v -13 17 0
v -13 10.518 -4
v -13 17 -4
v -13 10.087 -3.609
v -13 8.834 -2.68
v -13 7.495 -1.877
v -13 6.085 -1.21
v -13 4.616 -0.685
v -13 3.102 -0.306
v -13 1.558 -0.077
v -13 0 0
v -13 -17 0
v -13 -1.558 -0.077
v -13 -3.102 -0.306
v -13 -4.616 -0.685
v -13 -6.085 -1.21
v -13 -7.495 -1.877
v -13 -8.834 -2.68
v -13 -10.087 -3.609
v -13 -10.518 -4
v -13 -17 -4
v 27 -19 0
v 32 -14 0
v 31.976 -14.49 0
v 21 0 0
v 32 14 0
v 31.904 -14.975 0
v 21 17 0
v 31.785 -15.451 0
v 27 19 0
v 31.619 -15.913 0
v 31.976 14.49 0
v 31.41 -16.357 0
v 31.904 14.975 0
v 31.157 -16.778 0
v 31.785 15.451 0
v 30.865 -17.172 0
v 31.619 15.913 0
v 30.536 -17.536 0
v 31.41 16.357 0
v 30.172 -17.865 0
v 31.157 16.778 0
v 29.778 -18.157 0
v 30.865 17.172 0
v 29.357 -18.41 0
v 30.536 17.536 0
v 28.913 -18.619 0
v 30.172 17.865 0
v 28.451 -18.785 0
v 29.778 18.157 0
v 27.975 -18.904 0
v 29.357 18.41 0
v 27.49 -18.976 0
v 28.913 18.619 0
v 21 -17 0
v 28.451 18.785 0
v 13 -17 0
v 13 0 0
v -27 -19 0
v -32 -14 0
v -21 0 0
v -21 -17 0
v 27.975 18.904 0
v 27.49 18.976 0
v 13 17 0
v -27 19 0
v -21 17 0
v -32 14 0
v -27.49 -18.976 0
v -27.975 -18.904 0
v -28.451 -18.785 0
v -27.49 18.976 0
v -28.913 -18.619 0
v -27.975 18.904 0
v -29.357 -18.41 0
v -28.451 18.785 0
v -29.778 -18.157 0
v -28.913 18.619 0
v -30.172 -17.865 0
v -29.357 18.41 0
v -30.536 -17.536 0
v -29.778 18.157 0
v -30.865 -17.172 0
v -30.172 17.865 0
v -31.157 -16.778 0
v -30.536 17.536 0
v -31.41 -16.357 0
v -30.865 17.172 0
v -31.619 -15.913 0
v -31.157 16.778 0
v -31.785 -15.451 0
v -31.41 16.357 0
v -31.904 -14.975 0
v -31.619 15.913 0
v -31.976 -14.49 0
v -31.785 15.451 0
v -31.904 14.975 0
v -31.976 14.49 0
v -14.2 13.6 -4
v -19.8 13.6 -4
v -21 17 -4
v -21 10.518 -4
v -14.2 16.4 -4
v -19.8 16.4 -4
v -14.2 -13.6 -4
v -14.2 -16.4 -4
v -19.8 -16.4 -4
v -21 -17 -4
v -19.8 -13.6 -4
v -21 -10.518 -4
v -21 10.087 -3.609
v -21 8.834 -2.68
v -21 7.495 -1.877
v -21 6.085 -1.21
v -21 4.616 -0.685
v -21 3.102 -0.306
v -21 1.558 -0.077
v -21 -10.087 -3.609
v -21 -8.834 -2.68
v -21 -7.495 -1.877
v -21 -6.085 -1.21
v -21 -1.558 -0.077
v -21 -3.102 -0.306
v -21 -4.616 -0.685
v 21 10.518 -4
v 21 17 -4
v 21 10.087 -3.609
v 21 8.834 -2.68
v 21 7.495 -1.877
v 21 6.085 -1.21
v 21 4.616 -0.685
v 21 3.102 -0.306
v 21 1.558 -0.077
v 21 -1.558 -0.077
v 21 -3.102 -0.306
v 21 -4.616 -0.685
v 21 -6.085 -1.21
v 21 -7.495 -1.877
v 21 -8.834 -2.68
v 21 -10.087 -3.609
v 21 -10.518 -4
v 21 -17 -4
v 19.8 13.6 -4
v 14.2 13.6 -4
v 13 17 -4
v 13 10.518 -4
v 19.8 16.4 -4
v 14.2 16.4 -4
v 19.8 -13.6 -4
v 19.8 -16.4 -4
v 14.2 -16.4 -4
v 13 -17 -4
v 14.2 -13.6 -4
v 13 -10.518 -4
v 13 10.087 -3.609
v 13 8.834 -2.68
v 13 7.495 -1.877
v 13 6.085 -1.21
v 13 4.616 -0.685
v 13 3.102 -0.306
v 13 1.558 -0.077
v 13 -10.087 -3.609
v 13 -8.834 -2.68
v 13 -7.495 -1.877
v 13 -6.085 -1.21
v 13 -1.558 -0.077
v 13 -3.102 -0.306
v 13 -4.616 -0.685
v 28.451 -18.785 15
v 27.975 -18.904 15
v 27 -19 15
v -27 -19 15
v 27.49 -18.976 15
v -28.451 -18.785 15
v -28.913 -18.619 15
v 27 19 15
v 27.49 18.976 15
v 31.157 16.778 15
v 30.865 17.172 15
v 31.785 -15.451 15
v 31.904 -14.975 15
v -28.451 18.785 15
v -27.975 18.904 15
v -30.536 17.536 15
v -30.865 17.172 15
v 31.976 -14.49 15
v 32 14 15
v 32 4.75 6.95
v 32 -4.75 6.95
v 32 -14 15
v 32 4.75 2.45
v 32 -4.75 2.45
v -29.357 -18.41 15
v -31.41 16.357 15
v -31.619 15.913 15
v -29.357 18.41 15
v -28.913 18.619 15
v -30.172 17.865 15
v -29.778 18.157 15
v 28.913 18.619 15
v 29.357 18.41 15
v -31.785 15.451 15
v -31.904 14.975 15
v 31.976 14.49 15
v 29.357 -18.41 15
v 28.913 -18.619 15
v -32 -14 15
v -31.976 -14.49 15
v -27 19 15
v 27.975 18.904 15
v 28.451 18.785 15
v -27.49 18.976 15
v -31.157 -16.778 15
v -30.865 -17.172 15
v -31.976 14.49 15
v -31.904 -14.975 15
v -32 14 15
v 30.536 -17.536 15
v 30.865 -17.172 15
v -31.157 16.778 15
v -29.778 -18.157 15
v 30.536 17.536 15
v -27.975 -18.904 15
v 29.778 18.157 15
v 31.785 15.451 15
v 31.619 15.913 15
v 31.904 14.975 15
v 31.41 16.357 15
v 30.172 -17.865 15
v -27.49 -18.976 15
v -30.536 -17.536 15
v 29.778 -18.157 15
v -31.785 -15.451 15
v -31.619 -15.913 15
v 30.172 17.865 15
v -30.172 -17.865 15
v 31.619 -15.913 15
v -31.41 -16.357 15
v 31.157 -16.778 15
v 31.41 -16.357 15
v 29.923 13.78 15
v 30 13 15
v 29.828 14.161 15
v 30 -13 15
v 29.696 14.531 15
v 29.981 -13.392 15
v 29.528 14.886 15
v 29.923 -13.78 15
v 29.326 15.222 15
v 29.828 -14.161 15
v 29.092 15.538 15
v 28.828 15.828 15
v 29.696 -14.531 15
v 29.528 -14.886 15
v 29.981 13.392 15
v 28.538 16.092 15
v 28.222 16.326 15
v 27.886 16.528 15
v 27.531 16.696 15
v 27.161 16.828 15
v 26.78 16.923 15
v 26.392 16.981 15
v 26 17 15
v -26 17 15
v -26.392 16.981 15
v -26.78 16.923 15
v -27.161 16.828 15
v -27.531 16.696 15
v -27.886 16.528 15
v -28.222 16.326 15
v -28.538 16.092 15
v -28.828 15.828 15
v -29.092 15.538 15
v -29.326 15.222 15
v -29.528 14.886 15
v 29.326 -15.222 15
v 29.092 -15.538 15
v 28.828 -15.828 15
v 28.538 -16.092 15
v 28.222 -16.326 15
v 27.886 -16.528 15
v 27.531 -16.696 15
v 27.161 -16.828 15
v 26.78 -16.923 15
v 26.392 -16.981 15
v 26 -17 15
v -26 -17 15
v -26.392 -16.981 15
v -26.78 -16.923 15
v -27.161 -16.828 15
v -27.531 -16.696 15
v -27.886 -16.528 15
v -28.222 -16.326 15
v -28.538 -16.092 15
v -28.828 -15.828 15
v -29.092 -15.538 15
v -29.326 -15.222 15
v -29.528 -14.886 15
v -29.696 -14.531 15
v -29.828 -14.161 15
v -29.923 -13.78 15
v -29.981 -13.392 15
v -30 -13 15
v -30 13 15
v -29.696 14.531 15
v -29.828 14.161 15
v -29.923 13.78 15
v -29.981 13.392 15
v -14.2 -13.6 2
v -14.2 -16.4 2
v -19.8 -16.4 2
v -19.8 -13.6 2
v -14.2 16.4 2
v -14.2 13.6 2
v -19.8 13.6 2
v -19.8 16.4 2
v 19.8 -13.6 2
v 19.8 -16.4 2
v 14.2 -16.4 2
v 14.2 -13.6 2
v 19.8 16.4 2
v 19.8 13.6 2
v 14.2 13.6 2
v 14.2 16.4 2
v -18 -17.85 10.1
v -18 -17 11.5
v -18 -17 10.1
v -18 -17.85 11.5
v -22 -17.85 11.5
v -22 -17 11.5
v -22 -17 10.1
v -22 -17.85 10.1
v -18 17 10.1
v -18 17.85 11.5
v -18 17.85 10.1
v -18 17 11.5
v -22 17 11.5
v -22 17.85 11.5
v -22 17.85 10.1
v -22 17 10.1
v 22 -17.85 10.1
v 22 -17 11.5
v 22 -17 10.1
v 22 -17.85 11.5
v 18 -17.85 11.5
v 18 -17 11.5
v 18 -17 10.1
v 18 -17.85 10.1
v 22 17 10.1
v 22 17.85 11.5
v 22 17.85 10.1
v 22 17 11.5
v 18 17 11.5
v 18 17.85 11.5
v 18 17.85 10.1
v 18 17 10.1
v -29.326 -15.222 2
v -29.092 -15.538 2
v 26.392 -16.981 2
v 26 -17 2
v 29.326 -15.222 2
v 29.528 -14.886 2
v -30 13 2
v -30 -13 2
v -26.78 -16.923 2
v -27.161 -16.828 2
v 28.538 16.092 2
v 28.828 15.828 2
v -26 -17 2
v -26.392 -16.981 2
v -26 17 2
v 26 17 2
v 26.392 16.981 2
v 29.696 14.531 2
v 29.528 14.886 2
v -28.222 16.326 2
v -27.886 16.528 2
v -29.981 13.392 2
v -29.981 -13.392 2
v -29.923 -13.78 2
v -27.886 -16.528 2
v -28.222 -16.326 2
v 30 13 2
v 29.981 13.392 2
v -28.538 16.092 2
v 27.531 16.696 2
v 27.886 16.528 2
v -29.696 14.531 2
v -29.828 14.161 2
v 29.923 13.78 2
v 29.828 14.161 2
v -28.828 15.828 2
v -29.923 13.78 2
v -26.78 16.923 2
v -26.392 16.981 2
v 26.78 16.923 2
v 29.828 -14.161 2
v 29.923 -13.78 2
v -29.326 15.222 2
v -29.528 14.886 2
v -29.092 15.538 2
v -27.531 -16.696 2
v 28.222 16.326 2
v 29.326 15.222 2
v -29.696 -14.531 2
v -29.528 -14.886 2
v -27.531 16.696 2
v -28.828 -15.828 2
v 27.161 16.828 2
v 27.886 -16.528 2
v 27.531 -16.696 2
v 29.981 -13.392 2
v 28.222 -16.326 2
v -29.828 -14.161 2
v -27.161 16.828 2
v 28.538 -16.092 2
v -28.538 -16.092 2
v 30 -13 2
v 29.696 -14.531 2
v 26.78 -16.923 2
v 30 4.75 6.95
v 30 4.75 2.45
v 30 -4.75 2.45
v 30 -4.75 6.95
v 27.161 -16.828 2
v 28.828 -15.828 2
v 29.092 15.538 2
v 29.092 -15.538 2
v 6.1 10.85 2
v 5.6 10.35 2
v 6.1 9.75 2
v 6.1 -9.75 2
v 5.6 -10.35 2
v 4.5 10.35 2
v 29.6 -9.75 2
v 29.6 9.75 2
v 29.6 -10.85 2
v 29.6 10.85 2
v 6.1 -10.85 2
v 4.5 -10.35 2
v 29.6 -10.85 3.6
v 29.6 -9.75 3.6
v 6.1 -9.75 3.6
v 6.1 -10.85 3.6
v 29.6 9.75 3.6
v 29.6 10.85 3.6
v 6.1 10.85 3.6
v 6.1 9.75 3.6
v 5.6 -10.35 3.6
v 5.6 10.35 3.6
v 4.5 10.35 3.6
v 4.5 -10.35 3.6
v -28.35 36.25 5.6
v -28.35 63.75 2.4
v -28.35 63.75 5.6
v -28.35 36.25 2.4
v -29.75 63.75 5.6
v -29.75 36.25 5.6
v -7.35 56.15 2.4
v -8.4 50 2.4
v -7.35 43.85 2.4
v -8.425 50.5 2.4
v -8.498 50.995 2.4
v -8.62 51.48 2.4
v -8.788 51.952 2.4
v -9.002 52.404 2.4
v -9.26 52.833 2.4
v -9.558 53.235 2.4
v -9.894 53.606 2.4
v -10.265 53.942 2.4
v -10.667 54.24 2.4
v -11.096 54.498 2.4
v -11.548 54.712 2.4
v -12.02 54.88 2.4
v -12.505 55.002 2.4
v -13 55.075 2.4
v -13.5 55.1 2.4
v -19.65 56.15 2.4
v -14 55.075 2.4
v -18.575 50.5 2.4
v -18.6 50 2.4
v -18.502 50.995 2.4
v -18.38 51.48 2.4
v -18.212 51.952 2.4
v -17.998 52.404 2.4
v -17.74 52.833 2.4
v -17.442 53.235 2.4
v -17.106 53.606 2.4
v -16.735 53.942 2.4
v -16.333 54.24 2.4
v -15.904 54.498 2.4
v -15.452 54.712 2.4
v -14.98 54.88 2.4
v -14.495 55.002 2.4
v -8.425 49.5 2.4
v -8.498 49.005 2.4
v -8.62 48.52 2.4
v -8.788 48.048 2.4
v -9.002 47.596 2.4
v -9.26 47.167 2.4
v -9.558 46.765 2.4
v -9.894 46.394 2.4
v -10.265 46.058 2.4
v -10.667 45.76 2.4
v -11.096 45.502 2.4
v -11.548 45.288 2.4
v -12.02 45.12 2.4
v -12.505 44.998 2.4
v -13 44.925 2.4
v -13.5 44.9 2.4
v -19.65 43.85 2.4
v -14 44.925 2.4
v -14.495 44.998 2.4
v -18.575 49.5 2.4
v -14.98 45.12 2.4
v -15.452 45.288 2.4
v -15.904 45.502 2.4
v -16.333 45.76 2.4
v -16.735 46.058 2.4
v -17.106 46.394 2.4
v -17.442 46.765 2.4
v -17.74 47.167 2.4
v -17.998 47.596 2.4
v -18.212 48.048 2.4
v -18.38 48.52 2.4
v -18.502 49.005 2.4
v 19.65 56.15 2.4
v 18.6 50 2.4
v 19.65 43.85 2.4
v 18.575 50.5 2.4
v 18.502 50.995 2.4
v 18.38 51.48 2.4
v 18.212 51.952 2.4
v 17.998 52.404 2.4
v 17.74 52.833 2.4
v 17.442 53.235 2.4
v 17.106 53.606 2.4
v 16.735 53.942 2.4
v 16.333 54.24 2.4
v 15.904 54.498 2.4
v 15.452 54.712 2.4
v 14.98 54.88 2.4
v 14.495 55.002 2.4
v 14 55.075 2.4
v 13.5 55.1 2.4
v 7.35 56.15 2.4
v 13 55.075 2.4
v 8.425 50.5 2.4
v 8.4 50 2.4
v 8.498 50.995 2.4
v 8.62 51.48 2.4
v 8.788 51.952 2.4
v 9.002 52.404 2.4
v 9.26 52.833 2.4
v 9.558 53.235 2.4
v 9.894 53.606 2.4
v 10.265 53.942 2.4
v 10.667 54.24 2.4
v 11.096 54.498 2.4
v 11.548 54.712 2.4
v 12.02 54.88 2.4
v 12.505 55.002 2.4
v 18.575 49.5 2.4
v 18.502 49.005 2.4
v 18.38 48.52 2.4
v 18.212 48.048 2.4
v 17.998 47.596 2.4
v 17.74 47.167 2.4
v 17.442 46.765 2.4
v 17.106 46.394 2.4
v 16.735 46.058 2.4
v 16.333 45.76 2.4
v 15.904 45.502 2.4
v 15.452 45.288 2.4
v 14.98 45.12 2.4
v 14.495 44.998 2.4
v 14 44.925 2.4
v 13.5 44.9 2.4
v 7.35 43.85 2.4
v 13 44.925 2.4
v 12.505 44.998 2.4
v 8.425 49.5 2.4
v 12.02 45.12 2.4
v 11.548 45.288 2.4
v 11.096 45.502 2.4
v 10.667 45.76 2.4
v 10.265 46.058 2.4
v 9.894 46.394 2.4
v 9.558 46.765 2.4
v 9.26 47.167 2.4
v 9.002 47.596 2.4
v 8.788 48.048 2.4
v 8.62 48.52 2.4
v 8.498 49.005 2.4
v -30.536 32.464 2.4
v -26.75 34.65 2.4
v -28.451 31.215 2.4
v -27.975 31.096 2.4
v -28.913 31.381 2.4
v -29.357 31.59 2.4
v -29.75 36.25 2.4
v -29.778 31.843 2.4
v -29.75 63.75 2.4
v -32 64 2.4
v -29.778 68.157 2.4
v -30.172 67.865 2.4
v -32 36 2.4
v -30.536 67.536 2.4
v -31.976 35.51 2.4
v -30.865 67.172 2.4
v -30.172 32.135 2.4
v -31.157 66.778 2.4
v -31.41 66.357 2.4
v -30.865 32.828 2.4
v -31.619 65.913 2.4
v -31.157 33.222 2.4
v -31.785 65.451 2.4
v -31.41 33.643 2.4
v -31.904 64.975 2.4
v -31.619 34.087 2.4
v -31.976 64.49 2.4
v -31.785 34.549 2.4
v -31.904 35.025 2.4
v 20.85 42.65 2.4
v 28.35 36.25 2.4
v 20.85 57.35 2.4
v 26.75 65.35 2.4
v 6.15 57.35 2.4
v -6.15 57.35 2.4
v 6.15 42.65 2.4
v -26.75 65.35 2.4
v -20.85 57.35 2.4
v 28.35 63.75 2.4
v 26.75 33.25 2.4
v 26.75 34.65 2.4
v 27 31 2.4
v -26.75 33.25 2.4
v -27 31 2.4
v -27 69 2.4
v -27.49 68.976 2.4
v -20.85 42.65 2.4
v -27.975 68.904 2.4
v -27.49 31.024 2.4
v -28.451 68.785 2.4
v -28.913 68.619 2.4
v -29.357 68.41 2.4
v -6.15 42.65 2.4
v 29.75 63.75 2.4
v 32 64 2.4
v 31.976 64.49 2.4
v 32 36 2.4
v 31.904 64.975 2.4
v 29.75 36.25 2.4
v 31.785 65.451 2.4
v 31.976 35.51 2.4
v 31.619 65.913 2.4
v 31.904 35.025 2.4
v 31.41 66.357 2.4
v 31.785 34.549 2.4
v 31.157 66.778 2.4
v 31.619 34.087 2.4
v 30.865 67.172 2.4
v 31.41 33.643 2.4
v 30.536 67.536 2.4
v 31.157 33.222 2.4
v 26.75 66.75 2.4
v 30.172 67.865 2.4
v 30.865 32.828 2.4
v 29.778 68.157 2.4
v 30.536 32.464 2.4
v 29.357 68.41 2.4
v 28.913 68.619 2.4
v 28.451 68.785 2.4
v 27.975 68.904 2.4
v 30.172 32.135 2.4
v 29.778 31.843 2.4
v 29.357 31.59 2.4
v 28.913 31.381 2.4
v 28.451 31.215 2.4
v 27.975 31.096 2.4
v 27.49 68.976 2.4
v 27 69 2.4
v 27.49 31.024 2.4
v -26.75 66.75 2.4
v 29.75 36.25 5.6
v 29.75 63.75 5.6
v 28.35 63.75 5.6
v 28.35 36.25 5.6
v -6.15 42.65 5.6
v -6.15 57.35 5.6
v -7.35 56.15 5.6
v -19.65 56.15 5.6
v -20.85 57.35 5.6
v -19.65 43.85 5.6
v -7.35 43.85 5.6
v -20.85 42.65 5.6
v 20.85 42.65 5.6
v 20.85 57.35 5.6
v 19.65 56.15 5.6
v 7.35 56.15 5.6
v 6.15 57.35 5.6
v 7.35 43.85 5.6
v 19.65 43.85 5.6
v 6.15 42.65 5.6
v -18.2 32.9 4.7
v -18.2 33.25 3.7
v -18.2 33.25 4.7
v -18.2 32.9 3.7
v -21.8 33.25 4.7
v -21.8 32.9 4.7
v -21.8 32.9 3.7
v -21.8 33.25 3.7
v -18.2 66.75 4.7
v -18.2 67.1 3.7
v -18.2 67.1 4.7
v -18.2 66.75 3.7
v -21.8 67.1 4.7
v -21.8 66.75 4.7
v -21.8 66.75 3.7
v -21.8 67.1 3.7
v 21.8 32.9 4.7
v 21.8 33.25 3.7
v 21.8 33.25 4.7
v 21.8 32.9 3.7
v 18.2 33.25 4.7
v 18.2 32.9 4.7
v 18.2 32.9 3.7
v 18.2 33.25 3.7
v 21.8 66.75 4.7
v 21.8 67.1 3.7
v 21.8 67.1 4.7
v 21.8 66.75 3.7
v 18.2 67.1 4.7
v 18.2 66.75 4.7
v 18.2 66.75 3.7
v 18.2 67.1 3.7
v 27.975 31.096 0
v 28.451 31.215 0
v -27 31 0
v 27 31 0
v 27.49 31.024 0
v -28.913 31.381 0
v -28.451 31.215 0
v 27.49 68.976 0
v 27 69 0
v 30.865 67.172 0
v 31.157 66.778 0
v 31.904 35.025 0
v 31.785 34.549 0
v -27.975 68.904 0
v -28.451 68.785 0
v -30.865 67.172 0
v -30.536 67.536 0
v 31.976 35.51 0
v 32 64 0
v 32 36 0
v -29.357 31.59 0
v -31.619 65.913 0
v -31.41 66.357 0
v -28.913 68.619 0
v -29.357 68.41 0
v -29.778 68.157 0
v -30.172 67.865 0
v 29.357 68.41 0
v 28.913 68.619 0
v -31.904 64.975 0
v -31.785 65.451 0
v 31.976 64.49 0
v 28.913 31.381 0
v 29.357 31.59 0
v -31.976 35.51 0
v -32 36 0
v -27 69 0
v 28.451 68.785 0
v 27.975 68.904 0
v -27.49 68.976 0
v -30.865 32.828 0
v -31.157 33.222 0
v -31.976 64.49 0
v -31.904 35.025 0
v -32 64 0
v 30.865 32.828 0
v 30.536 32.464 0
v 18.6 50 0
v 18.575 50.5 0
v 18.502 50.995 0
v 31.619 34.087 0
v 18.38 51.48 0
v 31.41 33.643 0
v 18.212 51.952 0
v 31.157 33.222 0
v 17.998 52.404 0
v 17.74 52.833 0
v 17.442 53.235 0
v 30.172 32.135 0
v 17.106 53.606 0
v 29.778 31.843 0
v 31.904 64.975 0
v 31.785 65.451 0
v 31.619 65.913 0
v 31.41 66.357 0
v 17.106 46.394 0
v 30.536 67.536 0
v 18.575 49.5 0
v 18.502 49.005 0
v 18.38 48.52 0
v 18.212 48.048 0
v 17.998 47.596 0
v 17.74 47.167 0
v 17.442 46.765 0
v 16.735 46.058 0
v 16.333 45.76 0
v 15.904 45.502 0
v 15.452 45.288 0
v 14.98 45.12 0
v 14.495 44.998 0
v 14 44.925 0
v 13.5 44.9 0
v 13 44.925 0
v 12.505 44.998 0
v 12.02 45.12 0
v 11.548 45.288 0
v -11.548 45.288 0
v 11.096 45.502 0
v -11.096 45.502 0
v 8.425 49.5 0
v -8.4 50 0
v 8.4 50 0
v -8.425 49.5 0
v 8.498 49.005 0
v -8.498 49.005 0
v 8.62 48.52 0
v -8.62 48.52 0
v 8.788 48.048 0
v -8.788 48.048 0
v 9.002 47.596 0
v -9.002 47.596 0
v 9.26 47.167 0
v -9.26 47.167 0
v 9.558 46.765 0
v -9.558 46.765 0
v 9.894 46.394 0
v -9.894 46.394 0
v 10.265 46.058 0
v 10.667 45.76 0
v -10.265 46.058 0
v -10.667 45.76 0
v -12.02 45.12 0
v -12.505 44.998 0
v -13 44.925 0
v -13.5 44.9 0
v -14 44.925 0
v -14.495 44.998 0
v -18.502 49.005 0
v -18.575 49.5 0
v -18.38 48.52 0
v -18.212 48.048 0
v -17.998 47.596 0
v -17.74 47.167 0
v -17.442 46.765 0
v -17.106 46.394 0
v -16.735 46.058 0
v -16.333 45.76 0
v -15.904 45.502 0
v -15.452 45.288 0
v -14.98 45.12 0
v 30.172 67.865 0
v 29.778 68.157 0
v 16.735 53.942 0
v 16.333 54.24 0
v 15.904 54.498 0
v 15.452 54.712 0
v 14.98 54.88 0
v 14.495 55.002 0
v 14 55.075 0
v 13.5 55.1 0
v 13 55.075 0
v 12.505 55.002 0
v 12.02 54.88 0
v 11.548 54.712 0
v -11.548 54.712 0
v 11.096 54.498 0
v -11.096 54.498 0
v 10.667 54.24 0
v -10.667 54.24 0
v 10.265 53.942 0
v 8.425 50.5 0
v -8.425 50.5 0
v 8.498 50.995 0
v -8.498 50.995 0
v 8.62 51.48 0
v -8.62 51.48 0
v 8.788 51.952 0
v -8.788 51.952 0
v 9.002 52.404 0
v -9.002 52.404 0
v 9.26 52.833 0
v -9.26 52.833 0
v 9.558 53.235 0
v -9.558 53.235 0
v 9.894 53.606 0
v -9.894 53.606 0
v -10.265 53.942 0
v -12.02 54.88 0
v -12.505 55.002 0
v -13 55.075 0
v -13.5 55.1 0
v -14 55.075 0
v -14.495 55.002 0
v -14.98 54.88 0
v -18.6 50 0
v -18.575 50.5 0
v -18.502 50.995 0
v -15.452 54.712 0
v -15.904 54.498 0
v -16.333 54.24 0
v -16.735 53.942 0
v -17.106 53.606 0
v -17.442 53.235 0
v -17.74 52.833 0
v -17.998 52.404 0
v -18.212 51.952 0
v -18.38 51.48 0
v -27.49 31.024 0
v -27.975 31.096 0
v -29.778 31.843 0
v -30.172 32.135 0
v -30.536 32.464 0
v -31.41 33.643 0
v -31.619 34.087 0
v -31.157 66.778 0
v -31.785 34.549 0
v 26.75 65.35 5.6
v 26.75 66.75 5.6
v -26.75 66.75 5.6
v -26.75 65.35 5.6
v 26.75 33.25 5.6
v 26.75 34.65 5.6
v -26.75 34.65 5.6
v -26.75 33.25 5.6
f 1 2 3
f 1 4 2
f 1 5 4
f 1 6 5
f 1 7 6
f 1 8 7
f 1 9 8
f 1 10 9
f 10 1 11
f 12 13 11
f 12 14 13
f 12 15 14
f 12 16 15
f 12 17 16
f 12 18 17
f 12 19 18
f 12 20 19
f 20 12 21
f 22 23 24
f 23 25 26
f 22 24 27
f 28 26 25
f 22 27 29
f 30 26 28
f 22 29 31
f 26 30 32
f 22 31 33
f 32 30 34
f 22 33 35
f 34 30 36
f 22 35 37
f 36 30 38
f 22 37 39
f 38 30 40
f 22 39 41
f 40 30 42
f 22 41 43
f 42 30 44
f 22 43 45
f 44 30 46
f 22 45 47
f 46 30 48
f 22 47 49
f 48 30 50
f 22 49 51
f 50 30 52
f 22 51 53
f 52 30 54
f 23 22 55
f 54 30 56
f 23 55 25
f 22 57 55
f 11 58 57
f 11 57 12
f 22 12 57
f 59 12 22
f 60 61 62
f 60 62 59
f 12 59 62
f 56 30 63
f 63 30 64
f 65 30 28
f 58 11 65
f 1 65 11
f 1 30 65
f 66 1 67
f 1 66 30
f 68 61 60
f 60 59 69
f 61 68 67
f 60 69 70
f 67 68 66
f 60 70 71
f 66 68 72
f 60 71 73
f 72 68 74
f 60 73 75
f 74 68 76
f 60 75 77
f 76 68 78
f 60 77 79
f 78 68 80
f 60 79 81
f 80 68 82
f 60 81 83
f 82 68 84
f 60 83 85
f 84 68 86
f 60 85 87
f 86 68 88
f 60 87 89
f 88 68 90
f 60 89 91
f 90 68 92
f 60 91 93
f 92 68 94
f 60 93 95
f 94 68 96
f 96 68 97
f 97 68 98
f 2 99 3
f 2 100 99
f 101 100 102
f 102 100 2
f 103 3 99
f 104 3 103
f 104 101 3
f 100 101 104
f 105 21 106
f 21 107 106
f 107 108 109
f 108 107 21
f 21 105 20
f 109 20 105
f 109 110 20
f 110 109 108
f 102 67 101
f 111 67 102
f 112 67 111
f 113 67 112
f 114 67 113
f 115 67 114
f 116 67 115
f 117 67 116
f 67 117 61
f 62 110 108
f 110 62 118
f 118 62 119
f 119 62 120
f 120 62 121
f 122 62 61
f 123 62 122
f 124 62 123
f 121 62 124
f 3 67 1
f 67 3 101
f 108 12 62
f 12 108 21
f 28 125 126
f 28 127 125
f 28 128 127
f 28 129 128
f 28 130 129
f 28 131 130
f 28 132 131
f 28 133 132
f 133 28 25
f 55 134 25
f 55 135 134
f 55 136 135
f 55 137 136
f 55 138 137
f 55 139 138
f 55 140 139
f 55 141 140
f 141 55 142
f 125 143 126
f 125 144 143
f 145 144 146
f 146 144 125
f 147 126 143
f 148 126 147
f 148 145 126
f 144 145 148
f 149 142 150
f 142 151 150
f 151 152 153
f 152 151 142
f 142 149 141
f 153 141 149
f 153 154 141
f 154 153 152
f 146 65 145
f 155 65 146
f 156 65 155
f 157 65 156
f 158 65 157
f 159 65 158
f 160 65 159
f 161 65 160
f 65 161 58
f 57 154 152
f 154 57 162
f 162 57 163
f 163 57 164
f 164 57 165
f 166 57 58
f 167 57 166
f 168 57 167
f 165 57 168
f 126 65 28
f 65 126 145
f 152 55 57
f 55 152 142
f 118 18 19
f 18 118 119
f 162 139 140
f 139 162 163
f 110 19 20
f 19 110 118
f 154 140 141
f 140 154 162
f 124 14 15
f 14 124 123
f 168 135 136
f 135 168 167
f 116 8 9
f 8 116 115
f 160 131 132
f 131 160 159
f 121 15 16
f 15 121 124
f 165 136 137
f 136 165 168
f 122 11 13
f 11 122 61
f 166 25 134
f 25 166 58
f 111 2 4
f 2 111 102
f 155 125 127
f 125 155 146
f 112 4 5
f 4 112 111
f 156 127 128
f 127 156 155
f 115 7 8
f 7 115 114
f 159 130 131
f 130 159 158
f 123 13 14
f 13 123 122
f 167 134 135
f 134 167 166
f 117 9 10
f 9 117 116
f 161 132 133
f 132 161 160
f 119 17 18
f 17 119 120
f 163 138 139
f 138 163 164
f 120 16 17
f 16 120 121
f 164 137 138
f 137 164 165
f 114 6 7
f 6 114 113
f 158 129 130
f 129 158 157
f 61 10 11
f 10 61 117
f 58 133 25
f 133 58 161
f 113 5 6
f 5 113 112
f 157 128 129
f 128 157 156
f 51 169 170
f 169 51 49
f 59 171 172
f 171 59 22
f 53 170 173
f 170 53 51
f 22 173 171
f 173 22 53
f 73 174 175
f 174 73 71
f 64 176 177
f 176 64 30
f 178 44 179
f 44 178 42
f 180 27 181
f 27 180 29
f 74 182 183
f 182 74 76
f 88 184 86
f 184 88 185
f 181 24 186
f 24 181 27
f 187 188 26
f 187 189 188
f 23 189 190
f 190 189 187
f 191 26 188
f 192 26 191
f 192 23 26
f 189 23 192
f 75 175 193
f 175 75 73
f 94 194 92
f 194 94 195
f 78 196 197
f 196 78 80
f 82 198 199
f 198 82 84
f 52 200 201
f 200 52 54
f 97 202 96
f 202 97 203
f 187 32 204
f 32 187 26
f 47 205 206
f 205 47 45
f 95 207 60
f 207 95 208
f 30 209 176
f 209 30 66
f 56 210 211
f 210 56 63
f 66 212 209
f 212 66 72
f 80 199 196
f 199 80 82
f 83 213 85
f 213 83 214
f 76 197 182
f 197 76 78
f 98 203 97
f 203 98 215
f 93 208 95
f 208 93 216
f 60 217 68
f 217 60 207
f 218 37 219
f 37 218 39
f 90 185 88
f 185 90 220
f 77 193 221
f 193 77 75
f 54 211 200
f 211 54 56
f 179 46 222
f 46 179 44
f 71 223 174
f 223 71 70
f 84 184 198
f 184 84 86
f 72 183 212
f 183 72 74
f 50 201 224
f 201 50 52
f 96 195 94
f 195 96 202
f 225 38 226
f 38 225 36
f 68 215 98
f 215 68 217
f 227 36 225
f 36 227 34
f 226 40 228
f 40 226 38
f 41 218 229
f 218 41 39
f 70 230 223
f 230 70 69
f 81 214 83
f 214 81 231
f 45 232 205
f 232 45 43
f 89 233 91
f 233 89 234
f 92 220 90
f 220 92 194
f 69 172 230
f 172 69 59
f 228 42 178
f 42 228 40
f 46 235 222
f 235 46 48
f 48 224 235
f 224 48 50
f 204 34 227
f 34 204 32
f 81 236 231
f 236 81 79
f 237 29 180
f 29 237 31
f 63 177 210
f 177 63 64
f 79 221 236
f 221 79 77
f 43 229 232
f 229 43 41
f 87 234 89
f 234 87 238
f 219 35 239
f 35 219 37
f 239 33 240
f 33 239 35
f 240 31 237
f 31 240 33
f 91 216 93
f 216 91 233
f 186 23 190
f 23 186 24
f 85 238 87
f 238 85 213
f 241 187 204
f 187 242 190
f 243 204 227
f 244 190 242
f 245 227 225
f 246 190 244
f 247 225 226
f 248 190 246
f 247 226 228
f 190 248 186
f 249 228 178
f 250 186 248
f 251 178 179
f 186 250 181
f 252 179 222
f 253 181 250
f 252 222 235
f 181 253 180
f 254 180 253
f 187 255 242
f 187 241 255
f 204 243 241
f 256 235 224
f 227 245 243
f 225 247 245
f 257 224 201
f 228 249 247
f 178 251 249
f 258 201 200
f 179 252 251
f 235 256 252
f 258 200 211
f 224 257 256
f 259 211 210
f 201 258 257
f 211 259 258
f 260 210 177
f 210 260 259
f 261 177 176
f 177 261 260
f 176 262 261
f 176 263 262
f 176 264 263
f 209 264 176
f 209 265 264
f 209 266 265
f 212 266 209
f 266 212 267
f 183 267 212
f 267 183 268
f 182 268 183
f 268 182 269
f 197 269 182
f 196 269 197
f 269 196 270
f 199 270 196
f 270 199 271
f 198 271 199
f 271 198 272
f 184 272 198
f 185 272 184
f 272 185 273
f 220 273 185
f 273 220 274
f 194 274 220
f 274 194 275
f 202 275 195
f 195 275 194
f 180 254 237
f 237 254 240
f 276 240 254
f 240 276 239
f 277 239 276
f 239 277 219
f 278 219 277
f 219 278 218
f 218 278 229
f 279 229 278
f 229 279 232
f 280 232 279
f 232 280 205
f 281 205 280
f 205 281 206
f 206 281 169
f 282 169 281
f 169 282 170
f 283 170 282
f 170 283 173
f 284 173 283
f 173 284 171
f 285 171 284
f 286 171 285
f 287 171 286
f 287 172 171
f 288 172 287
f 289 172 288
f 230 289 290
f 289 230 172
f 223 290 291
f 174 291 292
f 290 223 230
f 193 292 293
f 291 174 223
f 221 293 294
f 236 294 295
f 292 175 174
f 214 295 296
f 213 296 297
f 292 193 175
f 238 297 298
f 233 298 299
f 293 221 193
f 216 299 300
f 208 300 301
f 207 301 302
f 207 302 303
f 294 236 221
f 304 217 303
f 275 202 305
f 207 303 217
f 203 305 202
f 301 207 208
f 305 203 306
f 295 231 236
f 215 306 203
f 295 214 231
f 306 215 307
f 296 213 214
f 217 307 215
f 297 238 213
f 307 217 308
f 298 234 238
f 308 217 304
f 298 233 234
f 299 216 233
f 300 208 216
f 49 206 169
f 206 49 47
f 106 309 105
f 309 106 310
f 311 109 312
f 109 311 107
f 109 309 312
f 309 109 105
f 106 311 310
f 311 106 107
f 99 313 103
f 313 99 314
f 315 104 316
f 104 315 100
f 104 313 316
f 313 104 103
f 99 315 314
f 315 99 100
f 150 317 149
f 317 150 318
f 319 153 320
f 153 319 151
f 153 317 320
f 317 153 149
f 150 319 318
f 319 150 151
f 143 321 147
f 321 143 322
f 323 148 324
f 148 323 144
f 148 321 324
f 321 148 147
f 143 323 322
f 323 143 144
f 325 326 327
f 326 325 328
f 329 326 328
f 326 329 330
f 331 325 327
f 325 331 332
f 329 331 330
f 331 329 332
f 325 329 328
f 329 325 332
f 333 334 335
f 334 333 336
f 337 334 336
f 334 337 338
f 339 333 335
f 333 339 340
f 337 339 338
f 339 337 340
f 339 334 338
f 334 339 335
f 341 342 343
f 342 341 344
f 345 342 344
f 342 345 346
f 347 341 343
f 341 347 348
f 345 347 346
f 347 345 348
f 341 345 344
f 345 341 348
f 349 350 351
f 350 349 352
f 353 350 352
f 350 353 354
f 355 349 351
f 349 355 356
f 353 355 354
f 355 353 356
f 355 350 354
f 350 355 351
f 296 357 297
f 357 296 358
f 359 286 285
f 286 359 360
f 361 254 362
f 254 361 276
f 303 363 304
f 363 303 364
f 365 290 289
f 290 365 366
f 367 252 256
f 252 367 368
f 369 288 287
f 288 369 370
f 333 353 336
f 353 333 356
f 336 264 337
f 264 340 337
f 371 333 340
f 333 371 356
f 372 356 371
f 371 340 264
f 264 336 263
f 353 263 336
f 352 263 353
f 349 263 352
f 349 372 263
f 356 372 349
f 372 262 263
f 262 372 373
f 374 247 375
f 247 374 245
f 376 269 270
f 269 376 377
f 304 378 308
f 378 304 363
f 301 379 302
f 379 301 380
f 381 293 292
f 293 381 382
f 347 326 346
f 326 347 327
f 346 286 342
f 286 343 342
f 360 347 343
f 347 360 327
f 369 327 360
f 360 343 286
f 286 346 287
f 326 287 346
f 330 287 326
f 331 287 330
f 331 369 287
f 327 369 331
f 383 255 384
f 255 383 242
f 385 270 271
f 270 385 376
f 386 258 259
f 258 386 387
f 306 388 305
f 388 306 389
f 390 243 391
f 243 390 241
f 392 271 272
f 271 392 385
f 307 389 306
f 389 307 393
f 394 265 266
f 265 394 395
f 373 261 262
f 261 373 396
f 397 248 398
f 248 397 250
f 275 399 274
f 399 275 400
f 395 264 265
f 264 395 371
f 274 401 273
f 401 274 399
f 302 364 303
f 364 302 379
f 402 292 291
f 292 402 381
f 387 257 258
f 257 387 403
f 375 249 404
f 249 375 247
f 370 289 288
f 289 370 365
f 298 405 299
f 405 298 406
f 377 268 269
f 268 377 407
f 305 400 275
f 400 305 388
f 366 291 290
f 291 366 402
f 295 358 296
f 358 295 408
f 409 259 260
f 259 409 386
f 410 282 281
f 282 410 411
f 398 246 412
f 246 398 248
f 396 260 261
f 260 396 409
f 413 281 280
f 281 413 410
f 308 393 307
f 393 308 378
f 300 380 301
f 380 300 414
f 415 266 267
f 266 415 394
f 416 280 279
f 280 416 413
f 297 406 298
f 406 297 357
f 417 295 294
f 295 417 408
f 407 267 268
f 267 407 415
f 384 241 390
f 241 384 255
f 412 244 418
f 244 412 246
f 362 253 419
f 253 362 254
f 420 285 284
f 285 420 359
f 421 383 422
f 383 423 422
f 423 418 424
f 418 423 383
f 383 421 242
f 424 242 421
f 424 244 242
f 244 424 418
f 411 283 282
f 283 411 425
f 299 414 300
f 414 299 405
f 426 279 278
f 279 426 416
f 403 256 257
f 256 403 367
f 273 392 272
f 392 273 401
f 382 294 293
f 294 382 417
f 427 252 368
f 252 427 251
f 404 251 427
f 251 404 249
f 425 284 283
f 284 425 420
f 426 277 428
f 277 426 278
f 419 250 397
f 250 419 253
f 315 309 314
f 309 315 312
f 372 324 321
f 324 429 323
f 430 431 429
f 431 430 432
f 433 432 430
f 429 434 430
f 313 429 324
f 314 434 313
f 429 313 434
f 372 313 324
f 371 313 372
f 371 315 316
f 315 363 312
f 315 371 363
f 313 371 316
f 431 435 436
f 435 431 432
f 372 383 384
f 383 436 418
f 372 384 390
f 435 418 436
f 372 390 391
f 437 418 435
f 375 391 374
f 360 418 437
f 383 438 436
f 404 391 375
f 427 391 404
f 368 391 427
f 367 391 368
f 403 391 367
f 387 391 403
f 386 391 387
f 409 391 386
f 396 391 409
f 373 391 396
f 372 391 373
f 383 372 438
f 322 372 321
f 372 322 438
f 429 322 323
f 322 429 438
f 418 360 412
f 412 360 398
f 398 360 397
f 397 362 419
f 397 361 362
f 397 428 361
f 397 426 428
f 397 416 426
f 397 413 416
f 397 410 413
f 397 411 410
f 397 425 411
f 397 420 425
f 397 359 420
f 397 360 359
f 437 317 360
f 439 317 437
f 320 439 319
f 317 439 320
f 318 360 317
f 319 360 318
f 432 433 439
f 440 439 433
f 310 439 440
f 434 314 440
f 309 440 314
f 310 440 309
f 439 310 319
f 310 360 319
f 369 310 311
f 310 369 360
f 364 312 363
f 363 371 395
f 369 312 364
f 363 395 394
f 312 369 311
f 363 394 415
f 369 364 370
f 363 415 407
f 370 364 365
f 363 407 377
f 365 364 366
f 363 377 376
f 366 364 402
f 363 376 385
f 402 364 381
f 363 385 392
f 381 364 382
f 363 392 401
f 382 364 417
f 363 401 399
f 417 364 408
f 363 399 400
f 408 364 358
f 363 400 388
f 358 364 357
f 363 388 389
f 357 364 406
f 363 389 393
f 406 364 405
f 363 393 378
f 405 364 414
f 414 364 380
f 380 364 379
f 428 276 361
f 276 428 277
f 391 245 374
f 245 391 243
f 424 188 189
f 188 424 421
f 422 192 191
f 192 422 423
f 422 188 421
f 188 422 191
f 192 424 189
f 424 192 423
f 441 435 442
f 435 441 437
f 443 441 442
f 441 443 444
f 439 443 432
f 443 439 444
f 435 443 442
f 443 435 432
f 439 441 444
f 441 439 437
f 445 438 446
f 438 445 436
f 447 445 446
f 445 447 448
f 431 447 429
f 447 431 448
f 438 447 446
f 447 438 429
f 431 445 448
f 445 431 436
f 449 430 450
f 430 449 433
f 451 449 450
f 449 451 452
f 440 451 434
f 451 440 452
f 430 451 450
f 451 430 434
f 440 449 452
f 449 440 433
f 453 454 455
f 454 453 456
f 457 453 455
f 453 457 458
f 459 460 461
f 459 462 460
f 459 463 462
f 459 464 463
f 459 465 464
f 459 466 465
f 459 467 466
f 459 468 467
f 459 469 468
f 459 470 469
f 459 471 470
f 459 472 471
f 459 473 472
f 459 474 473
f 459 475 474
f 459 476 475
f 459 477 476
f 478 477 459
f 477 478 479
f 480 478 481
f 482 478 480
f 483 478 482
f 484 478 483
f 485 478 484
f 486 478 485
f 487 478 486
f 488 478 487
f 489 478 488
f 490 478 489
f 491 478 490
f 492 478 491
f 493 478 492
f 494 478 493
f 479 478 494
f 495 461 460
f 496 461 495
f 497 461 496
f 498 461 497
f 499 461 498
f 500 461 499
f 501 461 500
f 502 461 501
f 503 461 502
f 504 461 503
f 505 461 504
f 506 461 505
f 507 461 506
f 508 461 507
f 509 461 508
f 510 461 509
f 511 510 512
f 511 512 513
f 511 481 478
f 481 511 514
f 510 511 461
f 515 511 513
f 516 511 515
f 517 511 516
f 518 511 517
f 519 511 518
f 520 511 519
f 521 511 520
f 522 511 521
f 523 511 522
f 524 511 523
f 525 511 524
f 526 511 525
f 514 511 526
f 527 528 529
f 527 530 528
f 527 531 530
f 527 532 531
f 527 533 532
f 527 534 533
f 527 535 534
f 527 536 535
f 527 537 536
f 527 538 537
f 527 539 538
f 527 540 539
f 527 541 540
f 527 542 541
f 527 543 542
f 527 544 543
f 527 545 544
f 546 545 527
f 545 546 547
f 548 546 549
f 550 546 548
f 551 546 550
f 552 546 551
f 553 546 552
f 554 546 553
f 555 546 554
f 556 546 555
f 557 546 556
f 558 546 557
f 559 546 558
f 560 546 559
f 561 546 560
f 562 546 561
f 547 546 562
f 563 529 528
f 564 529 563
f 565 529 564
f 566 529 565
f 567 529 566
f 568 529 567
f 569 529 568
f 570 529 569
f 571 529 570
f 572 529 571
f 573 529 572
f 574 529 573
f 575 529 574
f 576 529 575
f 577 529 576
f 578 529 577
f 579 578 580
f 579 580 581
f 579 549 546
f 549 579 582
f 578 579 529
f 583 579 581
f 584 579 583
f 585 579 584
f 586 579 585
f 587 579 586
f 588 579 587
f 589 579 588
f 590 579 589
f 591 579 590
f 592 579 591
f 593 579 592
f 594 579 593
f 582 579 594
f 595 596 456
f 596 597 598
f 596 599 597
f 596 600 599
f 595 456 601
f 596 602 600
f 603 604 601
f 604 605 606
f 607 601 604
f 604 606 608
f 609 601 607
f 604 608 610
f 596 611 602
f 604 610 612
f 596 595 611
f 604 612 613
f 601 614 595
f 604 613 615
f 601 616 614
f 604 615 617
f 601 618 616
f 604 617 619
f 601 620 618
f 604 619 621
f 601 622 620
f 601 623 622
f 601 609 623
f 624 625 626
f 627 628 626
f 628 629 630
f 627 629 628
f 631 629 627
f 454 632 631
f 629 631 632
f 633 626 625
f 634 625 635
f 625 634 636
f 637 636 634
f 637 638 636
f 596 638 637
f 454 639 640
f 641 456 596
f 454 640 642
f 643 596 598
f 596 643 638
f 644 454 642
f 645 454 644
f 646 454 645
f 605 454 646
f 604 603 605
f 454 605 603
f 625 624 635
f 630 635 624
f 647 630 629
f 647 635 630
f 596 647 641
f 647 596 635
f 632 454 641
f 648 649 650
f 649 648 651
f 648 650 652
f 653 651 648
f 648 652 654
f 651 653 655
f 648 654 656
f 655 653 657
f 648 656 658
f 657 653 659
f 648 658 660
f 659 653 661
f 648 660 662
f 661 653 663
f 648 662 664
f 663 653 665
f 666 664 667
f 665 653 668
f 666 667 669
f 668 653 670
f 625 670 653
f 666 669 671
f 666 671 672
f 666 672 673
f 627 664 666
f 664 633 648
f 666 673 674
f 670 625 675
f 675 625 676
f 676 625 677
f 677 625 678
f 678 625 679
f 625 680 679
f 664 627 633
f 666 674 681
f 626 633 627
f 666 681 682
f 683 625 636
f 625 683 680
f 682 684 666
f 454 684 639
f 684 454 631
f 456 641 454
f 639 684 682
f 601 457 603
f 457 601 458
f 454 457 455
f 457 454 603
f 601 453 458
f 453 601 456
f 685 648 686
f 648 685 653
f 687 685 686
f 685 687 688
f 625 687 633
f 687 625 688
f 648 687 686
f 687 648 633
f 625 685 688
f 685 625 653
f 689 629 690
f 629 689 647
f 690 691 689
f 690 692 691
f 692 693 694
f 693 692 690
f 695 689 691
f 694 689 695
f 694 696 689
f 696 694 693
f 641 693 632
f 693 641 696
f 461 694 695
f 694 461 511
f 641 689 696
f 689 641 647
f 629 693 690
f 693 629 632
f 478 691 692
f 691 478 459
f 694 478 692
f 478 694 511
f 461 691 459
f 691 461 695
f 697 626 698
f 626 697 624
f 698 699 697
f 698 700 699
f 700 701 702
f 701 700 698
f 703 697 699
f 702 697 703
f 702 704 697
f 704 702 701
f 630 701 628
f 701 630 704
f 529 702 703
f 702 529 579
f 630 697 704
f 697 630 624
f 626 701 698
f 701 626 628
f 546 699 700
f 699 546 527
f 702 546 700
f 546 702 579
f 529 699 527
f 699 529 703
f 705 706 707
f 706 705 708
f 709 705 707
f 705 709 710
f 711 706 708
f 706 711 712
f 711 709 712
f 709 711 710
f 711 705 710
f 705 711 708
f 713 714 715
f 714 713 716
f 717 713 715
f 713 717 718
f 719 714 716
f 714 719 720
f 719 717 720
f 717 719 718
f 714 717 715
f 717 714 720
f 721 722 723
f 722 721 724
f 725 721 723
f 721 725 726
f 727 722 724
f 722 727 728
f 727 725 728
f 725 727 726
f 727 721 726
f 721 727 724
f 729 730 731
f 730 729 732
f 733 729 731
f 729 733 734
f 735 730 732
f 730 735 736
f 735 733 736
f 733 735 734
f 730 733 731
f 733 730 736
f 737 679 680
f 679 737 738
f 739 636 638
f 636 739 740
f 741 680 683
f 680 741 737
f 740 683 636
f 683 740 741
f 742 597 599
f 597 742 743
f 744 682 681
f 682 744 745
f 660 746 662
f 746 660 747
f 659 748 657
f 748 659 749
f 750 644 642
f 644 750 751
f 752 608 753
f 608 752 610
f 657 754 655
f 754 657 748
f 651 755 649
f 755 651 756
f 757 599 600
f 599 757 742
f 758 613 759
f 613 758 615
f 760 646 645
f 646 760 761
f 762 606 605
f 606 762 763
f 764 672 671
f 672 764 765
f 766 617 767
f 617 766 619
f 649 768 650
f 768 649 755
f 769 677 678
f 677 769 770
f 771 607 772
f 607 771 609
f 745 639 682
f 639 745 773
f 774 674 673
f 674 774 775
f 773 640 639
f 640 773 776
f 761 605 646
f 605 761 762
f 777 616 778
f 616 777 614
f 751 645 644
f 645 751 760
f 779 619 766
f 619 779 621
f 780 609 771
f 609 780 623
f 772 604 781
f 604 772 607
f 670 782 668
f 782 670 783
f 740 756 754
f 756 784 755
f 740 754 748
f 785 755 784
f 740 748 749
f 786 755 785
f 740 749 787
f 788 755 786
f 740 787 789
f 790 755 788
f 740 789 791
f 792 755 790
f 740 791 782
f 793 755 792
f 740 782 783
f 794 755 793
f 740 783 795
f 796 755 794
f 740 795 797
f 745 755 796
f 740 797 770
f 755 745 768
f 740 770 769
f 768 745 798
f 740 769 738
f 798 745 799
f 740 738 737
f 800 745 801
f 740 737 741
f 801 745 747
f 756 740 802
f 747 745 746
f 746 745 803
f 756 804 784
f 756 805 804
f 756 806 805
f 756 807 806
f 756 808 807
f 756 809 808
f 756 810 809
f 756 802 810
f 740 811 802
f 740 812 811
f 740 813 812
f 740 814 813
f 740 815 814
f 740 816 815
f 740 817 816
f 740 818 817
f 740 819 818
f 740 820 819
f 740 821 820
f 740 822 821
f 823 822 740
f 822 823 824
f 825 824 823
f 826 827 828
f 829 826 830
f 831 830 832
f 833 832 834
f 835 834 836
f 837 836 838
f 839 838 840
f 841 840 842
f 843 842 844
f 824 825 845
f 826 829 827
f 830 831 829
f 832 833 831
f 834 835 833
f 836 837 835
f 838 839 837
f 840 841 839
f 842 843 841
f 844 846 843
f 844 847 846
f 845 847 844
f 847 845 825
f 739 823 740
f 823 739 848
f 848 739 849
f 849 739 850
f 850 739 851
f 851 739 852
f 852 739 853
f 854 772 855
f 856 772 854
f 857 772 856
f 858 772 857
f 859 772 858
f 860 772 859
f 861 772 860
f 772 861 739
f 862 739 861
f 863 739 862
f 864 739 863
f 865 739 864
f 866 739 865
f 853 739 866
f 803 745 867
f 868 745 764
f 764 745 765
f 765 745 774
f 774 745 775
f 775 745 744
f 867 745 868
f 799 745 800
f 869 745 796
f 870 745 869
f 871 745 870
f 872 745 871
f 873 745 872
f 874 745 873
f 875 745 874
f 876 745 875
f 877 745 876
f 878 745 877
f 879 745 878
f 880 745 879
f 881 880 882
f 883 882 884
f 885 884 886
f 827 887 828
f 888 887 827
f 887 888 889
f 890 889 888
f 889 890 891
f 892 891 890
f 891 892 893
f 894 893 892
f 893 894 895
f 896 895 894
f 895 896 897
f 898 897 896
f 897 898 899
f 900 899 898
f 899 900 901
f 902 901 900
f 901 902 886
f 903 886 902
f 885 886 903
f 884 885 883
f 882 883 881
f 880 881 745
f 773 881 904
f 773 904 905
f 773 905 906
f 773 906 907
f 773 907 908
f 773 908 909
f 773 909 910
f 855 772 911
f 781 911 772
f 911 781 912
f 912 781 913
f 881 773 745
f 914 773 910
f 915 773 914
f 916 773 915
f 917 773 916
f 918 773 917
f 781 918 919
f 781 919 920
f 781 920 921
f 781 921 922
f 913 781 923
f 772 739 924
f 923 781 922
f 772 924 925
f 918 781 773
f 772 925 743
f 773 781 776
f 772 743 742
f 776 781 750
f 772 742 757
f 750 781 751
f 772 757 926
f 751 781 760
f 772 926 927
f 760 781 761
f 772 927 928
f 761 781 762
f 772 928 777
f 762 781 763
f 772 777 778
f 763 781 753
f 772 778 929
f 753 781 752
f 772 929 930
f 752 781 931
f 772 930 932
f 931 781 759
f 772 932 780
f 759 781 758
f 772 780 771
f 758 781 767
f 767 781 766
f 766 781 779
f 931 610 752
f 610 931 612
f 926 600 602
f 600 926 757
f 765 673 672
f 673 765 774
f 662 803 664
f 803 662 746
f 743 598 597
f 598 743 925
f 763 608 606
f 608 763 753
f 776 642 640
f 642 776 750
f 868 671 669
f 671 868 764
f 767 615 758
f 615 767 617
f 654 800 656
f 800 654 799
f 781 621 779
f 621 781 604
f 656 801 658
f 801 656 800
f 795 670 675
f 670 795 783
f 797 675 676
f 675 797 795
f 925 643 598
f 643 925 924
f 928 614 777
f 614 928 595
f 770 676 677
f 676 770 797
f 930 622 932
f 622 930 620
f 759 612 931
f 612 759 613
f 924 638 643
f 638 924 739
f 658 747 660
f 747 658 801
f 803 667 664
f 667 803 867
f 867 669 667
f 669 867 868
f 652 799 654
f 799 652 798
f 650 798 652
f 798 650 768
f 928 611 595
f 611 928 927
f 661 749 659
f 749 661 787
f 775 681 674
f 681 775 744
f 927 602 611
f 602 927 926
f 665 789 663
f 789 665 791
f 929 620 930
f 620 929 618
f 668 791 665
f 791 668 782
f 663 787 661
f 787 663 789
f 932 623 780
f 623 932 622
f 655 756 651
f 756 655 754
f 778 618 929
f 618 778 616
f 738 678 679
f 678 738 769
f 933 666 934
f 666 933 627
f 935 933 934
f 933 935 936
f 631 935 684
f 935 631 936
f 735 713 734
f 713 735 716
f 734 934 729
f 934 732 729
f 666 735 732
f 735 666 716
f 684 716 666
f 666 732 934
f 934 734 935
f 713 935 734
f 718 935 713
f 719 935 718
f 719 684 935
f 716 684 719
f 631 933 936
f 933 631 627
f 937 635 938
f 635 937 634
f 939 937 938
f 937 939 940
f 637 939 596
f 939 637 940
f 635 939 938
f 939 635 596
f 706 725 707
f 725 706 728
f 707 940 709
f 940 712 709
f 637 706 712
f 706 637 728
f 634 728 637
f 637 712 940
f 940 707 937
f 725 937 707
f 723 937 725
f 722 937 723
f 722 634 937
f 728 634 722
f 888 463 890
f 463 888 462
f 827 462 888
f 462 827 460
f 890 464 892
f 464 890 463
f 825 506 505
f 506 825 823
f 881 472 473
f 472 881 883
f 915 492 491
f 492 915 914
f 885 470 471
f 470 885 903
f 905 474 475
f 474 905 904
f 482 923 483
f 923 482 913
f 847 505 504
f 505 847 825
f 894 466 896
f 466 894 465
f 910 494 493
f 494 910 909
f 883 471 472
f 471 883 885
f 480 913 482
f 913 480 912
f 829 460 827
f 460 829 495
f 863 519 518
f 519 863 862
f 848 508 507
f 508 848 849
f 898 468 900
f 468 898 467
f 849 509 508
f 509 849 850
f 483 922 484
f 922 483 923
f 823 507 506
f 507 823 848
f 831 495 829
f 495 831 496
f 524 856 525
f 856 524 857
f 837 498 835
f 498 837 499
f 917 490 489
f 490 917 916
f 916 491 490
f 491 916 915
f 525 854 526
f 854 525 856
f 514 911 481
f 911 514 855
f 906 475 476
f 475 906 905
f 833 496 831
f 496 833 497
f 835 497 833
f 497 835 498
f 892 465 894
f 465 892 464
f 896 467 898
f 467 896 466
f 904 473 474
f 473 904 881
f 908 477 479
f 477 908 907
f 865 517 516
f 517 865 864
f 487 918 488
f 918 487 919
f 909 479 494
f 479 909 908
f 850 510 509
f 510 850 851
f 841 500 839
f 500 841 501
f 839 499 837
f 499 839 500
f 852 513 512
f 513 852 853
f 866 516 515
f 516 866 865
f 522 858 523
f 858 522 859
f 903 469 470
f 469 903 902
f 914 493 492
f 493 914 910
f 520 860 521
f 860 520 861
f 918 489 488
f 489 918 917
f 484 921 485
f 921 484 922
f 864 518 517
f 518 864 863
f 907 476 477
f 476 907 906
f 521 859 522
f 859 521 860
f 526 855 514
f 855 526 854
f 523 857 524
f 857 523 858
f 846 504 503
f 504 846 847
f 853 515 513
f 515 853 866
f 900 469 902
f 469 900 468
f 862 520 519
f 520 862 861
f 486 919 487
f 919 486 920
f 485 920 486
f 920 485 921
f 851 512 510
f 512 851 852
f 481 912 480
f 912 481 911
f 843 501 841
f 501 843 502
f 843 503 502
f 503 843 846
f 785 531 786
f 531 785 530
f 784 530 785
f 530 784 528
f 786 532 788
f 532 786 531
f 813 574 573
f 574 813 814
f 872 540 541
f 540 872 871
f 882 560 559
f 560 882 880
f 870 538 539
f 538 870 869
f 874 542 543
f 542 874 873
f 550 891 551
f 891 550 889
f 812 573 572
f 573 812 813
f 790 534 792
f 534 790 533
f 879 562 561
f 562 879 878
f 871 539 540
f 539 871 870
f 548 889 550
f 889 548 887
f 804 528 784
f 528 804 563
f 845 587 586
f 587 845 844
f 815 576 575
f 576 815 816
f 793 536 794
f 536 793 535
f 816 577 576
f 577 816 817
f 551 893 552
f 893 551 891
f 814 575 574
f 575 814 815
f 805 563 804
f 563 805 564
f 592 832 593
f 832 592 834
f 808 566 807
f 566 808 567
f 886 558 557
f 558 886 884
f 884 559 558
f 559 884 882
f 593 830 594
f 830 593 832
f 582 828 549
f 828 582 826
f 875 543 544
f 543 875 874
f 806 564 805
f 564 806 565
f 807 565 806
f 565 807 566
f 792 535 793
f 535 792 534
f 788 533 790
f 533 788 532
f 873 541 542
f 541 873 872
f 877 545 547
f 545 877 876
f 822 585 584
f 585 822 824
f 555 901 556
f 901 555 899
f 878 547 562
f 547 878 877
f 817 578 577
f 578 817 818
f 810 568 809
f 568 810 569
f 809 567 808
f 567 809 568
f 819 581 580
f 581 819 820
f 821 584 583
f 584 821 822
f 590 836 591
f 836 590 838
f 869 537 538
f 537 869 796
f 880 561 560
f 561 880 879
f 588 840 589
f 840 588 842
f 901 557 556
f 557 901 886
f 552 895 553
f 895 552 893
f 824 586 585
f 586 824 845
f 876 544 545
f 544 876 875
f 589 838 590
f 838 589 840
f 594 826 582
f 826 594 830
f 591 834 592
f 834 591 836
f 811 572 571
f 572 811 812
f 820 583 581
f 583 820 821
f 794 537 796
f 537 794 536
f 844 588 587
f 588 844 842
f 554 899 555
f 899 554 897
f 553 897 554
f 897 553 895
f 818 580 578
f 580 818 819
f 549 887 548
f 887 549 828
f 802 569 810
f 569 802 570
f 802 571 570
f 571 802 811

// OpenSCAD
// MyWhoosh BLE shifter enclosure
// ESP32-C3 SuperMini + two 12 x 12 mm tactile switches
// Units: millimetres. Change `part` to export one component.

part = "both";  // "bottom", "lid", or "both"
$fn = 64;

// Printer fit tuning
fit_clearance = 0.25;
wall = 2.0;
roof = 2.4;

// Case
case_length = 64;
case_width = 38;
corner_radius = 5;
bottom_height = 15;

// Common ESP32-C3 SuperMini maximum envelope. Measure clones before printing.
board_length = 23.5;
board_width = 18.5;
board_height = 5.5;
board_clearance = 0.5;
usb_width = 9.5;
usb_height = 4.5;

// 12 x 12 x 7.3 mm tactile switches with coloured caps
switch_body = 12.0;
switch_clearance = 0.3;
cap_hole = 10.2;
button_spacing = 27;

// Mounting
zip_tie_width = 5.0;
zip_tie_thickness = 2.0;
strap_spacing = 34;
handlebar_diameter = 31.8;
mount_depth = 4.0;

module rounded_prism(length, width, radius, height) {
    linear_extrude(height = height)
        offset(r = radius)
            square([length - 2 * radius, width - 2 * radius], center = true);
}

module handlebar_feet() {
    difference() {
        for (x = [-strap_spacing / 2, strap_spacing / 2])
            translate([x, 0, -mount_depth / 2])
                cube([zip_tie_width + 3.0, case_width - 4, mount_depth], center = true);

        // A shallow 31.8 mm handlebar saddle prevents the case rocking.
        translate([0, 0, -handlebar_diameter / 2])
            rotate([0, 90, 0])
                cylinder(d = handlebar_diameter, h = case_length + 2, center = true);
    }
}

module board_guides() {
    board_x = case_length / 2 - wall - board_length / 2 - 0.4;
    guide_z = wall + 0.8;

    // Low rails locate the board while leaving its castellated pads accessible.
    for (y = [-1, 1])
        translate([board_x, y * (board_width / 2 + board_clearance + 0.55), guide_z])
            cube([board_length, 1.1, 1.6], center = true);

    translate([board_x - board_length / 2 - board_clearance - 0.55, 0, guide_z])
        cube([1.1, board_width + 2.2, 1.6], center = true);
}

module bottom() {
    union() {
        difference() {
            union() {
                rounded_prism(case_length, case_width, corner_radius, bottom_height);
                handlebar_feet();
            }

            // Main electronics and wiring cavity.
            translate([0, 0, wall])
                rounded_prism(
                    case_length - 2 * wall,
                    case_width - 2 * wall,
                    corner_radius - wall / 2,
                    bottom_height + 1
                );

            // USB-C opening, aligned to the connector on the SuperMini's short end.
            usb_z = wall + 2.7;
            translate([case_length / 2, 0, usb_z])
                cube([2 * wall + 2, usb_width, usb_height], center = true);

            // Two zip ties each pass through a pair of floor slots and around the bar.
            for (x = [-strap_spacing / 2, strap_spacing / 2],
                 y = [-(case_width / 2 - wall - 2), case_width / 2 - wall - 2])
                translate([x, y, (wall - mount_depth) / 2])
                    cube([
                        zip_tie_width + 0.6,
                        zip_tie_thickness + 0.8,
                        wall + mount_depth + 2
                    ], center = true);

            // Internal snap detents for the lid; they do not perforate the outer wall.
            for (x = [-20, 20], y = [-1, 1])
                translate([x, y * (case_width / 2 - wall + 0.35), bottom_height - 4.2])
                    cube([4.0, 1.0, 1.4], center = true);
        }

        board_guides();
    }
}

module switch_guide(x) {
    guide_inner = switch_body + switch_clearance;
    guide_wall = 1.2;
    guide_height = 3.2;

    for (y = [-1, 1])
        translate([x, y * (guide_inner / 2 + guide_wall / 2), roof + guide_height / 2])
            cube([guide_inner + 2 * guide_wall, guide_wall, guide_height], center = true);

    for (side = [-1, 1])
        translate([x + side * (guide_inner / 2 + guide_wall / 2), 0, roof + guide_height / 2])
            cube([guide_wall, guide_inner, guide_height], center = true);
}

module lid() {
    skirt_outer_length = case_length - 2 * wall - 2 * fit_clearance;
    skirt_outer_width = case_width - 2 * wall - 2 * fit_clearance;
    skirt_wall = 1.4;
    skirt_height = 3.2;

    difference() {
        union() {
            rounded_prism(case_length, case_width, corner_radius, roof);

            // Locating skirt. The lid prints with its flat outside face on the bed.
            translate([0, (skirt_outer_width - skirt_wall) / 2, roof + skirt_height / 2])
                cube([skirt_outer_length - 6, skirt_wall, skirt_height], center = true);
            translate([0, -(skirt_outer_width - skirt_wall) / 2, roof + skirt_height / 2])
                cube([skirt_outer_length - 6, skirt_wall, skirt_height], center = true);
            for (x = [-1, 1])
                translate([x * (skirt_outer_length - skirt_wall) / 2, 0, roof + skirt_height / 2])
                    cube([skirt_wall, skirt_outer_width - 6, skirt_height], center = true);

            for (x = [-button_spacing / 2, button_spacing / 2])
                switch_guide(x);

            // Small bumps engage the bottom's internal detents.
            for (x = [-20, 20], y = [-1, 1])
                translate([x, y * skirt_outer_width / 2, roof + 1.8])
                    cube([3.6, 0.7, 1.0], center = true);
        }

        for (x = [-button_spacing / 2, button_spacing / 2])
            translate([x, 0, -0.1])
                cylinder(d = cap_hole, h = roof + 0.2);
    }
}

if (part == "bottom") {
    bottom();
} else if (part == "lid") {
    lid();
} else {
    bottom();
    translate([0, case_width + 12, 0]) lid();
}
